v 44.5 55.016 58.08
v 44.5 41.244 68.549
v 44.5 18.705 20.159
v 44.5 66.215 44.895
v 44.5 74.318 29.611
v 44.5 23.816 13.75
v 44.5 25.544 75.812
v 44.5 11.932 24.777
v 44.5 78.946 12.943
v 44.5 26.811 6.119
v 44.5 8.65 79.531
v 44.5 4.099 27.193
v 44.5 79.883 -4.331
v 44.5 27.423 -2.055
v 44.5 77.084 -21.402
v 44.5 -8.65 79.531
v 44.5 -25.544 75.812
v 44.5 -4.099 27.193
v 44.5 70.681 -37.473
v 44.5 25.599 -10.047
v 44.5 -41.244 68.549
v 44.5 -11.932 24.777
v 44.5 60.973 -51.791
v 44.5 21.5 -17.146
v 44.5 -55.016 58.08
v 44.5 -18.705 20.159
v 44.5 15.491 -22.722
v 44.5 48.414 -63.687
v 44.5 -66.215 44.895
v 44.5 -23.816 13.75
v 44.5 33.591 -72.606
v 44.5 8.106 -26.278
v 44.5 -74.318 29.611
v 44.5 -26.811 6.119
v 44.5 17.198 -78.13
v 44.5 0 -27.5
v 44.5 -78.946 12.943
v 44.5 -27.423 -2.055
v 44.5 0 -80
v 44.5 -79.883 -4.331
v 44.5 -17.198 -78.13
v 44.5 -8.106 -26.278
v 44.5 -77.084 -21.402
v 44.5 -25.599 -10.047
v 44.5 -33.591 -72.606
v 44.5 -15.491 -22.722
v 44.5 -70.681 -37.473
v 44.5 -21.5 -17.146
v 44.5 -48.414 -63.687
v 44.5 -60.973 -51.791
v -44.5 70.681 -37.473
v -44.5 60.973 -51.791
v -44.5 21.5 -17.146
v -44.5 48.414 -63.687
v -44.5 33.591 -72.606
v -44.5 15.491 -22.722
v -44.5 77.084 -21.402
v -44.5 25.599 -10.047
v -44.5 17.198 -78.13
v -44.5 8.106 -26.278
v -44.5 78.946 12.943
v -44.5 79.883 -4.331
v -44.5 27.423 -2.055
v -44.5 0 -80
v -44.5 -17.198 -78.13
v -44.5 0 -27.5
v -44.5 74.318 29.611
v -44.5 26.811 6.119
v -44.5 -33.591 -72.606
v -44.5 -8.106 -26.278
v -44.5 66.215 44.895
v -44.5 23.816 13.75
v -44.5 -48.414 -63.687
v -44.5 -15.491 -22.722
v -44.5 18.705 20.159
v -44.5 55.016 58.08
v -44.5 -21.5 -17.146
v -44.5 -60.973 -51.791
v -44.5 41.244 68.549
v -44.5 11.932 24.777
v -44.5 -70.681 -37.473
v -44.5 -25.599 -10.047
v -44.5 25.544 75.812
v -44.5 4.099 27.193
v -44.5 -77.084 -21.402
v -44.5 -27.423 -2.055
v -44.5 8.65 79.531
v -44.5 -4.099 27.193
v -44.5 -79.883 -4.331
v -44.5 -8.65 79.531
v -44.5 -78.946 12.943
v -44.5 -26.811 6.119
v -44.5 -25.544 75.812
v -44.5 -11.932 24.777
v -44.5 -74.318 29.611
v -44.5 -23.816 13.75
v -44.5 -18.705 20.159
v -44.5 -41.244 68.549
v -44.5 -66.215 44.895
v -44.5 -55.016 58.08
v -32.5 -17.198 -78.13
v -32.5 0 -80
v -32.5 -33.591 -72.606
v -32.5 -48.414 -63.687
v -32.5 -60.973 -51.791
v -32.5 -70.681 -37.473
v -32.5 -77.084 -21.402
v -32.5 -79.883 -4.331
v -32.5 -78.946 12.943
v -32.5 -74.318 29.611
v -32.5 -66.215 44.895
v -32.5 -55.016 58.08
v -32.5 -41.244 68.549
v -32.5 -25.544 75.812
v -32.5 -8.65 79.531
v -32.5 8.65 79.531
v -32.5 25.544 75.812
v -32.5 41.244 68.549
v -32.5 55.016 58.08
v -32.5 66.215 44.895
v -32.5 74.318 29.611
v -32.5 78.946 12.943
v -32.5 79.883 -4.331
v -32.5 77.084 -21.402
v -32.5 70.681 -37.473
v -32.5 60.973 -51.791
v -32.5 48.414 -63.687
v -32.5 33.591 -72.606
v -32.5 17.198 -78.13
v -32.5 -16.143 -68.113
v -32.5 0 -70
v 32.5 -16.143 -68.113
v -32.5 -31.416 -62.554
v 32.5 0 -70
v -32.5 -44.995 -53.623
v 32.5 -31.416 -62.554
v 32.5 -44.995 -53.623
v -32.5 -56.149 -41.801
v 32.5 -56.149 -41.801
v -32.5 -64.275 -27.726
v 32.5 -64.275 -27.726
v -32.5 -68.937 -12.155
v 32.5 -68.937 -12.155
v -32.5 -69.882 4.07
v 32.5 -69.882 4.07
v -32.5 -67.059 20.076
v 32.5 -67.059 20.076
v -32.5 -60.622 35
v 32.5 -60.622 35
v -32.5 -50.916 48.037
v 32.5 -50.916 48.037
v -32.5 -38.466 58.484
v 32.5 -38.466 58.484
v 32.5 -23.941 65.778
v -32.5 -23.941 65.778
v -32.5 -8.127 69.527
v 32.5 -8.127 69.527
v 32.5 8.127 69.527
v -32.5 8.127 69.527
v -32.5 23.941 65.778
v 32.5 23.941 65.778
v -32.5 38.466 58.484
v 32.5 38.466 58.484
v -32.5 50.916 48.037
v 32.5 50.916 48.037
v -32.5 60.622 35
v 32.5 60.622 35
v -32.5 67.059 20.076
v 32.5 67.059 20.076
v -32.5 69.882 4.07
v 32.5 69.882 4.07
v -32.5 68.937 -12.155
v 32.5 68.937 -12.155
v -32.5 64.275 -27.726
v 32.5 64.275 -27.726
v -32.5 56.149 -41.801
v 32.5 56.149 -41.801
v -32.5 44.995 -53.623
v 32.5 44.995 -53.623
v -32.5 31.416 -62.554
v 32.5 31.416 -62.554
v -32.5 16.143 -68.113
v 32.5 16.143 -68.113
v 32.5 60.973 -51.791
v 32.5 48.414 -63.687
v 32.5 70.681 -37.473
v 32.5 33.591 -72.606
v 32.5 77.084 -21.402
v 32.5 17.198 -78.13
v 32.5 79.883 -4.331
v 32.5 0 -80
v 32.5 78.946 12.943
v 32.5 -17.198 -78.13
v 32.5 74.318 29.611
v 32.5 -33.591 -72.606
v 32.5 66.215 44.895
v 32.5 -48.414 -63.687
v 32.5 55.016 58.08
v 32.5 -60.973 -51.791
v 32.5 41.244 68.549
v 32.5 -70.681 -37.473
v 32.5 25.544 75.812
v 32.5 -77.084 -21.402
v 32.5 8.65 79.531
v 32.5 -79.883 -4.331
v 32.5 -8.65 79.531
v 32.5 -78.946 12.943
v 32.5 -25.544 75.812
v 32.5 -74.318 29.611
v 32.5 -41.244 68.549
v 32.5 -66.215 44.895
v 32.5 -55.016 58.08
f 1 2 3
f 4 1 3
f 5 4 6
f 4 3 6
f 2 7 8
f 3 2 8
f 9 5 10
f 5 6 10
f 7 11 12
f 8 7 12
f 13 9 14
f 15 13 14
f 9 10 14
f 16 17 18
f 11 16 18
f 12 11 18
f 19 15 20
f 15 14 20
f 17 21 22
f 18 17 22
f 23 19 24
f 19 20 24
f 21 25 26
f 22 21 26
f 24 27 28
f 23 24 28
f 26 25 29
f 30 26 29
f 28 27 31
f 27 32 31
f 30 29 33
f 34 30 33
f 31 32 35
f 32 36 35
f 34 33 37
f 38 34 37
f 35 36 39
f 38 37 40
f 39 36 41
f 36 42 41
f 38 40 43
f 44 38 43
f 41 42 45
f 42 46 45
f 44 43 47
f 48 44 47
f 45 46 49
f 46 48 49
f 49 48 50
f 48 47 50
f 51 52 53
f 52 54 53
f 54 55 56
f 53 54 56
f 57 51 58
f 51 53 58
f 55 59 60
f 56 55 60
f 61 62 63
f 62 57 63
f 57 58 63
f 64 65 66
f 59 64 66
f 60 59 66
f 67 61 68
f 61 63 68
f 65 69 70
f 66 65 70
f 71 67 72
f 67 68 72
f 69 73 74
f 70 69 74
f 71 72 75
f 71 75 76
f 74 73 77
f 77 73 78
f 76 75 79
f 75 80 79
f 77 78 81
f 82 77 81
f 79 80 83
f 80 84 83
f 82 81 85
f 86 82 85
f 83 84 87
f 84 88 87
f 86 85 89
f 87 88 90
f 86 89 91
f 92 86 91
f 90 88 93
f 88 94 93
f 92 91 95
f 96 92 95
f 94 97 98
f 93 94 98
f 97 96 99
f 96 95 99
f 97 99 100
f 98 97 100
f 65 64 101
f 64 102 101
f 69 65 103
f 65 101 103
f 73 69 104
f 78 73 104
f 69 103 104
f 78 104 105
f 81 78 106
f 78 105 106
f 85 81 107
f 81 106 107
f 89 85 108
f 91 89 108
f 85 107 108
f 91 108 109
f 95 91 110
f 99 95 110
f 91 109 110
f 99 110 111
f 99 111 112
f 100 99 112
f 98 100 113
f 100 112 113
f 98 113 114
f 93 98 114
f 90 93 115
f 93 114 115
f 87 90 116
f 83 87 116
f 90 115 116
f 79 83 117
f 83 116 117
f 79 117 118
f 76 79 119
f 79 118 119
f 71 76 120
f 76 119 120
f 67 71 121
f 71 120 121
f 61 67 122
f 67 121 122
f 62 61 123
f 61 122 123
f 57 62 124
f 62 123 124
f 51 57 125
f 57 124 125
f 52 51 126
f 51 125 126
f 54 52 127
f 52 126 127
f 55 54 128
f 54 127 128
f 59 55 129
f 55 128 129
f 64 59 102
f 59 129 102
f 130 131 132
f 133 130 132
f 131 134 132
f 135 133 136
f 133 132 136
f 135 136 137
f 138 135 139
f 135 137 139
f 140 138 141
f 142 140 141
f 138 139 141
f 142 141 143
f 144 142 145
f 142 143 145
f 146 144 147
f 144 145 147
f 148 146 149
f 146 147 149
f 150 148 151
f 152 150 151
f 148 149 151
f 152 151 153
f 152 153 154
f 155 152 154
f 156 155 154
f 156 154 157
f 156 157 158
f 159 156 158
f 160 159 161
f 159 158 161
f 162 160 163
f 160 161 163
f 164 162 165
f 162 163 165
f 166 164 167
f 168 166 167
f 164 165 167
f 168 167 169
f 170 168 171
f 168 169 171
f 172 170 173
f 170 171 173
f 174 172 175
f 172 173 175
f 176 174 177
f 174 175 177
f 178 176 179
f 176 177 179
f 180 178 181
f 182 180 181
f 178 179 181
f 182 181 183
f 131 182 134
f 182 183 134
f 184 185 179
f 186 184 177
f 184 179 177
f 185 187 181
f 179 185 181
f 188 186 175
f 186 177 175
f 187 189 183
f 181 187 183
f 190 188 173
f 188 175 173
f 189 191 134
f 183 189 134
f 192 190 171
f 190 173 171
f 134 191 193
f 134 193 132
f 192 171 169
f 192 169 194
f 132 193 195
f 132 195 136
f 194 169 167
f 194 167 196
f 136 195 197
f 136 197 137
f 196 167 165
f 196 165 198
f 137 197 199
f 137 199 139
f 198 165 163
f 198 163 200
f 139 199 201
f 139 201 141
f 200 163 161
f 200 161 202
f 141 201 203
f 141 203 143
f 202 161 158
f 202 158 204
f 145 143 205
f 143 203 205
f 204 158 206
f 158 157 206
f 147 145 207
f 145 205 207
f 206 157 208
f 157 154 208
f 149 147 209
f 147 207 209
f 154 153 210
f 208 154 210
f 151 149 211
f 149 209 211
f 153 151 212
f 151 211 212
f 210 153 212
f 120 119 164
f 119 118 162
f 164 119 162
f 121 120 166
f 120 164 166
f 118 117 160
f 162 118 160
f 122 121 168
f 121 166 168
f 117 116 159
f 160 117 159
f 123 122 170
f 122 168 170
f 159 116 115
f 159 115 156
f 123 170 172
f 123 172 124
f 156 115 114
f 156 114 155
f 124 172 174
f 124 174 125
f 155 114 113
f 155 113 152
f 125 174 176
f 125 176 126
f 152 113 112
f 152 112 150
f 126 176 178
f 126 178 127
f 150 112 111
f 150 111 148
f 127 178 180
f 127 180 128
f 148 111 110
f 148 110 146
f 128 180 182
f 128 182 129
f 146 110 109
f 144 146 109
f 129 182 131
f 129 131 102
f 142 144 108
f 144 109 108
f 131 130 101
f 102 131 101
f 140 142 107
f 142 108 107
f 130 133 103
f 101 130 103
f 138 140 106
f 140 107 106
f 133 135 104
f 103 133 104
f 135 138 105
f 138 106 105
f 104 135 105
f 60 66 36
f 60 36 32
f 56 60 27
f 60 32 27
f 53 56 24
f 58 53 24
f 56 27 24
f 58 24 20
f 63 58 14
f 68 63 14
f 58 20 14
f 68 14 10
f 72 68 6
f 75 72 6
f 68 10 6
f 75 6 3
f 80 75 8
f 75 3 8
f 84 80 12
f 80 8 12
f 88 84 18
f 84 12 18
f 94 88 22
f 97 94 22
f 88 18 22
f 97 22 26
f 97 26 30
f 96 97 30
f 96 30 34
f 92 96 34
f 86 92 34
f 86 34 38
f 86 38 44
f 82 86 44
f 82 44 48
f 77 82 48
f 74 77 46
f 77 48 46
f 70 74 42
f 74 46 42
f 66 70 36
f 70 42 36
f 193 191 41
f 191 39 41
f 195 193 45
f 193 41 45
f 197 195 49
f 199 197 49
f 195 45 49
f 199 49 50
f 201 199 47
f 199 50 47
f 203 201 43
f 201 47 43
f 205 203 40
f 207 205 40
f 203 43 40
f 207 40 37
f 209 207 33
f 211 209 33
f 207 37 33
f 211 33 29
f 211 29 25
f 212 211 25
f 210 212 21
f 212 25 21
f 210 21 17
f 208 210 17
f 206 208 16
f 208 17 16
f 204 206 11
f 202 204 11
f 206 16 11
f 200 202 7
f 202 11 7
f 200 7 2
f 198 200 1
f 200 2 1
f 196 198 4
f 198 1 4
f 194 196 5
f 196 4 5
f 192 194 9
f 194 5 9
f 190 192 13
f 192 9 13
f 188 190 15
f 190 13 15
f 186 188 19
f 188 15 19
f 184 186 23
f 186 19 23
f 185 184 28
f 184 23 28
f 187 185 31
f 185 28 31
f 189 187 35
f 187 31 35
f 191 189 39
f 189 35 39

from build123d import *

# Parameters (mm, degrees)
ESQUISSE2_R             = 27.5
ENL_V_MAT_EXTRU_1_DEPTH = 55


with BuildPart() as part:
    # Esquisse1 → Révolution2 (revolve)
    with BuildSketch(Plane(origin=(0, 0, 0), x_dir=(1, 0, 0), z_dir=(0, 1, 0))):
        Polygon((44.5, 0), (-44.5, 0), (-44.5, 80), (-32.5, 80), (-32.5, 70), (32.5, 70), (32.5, 80), (44.5, 80), align=None)
    revolve(axis=Axis((44.5, 0, 0), (-1, 0, 0)))

    # Esquisse2 → Enlèv. mat.-Extru.1 (cut, symmetric)
    with BuildSketch(Plane(origin=(0, 0, 0), x_dir=(0, 0, -1), z_dir=(1, 0, 0))):
        Circle(ESQUISSE2_R)
    extrude(amount=ENL_V_MAT_EXTRU_1_DEPTH, both=True, mode=Mode.SUBTRACT)


solid = part.part
